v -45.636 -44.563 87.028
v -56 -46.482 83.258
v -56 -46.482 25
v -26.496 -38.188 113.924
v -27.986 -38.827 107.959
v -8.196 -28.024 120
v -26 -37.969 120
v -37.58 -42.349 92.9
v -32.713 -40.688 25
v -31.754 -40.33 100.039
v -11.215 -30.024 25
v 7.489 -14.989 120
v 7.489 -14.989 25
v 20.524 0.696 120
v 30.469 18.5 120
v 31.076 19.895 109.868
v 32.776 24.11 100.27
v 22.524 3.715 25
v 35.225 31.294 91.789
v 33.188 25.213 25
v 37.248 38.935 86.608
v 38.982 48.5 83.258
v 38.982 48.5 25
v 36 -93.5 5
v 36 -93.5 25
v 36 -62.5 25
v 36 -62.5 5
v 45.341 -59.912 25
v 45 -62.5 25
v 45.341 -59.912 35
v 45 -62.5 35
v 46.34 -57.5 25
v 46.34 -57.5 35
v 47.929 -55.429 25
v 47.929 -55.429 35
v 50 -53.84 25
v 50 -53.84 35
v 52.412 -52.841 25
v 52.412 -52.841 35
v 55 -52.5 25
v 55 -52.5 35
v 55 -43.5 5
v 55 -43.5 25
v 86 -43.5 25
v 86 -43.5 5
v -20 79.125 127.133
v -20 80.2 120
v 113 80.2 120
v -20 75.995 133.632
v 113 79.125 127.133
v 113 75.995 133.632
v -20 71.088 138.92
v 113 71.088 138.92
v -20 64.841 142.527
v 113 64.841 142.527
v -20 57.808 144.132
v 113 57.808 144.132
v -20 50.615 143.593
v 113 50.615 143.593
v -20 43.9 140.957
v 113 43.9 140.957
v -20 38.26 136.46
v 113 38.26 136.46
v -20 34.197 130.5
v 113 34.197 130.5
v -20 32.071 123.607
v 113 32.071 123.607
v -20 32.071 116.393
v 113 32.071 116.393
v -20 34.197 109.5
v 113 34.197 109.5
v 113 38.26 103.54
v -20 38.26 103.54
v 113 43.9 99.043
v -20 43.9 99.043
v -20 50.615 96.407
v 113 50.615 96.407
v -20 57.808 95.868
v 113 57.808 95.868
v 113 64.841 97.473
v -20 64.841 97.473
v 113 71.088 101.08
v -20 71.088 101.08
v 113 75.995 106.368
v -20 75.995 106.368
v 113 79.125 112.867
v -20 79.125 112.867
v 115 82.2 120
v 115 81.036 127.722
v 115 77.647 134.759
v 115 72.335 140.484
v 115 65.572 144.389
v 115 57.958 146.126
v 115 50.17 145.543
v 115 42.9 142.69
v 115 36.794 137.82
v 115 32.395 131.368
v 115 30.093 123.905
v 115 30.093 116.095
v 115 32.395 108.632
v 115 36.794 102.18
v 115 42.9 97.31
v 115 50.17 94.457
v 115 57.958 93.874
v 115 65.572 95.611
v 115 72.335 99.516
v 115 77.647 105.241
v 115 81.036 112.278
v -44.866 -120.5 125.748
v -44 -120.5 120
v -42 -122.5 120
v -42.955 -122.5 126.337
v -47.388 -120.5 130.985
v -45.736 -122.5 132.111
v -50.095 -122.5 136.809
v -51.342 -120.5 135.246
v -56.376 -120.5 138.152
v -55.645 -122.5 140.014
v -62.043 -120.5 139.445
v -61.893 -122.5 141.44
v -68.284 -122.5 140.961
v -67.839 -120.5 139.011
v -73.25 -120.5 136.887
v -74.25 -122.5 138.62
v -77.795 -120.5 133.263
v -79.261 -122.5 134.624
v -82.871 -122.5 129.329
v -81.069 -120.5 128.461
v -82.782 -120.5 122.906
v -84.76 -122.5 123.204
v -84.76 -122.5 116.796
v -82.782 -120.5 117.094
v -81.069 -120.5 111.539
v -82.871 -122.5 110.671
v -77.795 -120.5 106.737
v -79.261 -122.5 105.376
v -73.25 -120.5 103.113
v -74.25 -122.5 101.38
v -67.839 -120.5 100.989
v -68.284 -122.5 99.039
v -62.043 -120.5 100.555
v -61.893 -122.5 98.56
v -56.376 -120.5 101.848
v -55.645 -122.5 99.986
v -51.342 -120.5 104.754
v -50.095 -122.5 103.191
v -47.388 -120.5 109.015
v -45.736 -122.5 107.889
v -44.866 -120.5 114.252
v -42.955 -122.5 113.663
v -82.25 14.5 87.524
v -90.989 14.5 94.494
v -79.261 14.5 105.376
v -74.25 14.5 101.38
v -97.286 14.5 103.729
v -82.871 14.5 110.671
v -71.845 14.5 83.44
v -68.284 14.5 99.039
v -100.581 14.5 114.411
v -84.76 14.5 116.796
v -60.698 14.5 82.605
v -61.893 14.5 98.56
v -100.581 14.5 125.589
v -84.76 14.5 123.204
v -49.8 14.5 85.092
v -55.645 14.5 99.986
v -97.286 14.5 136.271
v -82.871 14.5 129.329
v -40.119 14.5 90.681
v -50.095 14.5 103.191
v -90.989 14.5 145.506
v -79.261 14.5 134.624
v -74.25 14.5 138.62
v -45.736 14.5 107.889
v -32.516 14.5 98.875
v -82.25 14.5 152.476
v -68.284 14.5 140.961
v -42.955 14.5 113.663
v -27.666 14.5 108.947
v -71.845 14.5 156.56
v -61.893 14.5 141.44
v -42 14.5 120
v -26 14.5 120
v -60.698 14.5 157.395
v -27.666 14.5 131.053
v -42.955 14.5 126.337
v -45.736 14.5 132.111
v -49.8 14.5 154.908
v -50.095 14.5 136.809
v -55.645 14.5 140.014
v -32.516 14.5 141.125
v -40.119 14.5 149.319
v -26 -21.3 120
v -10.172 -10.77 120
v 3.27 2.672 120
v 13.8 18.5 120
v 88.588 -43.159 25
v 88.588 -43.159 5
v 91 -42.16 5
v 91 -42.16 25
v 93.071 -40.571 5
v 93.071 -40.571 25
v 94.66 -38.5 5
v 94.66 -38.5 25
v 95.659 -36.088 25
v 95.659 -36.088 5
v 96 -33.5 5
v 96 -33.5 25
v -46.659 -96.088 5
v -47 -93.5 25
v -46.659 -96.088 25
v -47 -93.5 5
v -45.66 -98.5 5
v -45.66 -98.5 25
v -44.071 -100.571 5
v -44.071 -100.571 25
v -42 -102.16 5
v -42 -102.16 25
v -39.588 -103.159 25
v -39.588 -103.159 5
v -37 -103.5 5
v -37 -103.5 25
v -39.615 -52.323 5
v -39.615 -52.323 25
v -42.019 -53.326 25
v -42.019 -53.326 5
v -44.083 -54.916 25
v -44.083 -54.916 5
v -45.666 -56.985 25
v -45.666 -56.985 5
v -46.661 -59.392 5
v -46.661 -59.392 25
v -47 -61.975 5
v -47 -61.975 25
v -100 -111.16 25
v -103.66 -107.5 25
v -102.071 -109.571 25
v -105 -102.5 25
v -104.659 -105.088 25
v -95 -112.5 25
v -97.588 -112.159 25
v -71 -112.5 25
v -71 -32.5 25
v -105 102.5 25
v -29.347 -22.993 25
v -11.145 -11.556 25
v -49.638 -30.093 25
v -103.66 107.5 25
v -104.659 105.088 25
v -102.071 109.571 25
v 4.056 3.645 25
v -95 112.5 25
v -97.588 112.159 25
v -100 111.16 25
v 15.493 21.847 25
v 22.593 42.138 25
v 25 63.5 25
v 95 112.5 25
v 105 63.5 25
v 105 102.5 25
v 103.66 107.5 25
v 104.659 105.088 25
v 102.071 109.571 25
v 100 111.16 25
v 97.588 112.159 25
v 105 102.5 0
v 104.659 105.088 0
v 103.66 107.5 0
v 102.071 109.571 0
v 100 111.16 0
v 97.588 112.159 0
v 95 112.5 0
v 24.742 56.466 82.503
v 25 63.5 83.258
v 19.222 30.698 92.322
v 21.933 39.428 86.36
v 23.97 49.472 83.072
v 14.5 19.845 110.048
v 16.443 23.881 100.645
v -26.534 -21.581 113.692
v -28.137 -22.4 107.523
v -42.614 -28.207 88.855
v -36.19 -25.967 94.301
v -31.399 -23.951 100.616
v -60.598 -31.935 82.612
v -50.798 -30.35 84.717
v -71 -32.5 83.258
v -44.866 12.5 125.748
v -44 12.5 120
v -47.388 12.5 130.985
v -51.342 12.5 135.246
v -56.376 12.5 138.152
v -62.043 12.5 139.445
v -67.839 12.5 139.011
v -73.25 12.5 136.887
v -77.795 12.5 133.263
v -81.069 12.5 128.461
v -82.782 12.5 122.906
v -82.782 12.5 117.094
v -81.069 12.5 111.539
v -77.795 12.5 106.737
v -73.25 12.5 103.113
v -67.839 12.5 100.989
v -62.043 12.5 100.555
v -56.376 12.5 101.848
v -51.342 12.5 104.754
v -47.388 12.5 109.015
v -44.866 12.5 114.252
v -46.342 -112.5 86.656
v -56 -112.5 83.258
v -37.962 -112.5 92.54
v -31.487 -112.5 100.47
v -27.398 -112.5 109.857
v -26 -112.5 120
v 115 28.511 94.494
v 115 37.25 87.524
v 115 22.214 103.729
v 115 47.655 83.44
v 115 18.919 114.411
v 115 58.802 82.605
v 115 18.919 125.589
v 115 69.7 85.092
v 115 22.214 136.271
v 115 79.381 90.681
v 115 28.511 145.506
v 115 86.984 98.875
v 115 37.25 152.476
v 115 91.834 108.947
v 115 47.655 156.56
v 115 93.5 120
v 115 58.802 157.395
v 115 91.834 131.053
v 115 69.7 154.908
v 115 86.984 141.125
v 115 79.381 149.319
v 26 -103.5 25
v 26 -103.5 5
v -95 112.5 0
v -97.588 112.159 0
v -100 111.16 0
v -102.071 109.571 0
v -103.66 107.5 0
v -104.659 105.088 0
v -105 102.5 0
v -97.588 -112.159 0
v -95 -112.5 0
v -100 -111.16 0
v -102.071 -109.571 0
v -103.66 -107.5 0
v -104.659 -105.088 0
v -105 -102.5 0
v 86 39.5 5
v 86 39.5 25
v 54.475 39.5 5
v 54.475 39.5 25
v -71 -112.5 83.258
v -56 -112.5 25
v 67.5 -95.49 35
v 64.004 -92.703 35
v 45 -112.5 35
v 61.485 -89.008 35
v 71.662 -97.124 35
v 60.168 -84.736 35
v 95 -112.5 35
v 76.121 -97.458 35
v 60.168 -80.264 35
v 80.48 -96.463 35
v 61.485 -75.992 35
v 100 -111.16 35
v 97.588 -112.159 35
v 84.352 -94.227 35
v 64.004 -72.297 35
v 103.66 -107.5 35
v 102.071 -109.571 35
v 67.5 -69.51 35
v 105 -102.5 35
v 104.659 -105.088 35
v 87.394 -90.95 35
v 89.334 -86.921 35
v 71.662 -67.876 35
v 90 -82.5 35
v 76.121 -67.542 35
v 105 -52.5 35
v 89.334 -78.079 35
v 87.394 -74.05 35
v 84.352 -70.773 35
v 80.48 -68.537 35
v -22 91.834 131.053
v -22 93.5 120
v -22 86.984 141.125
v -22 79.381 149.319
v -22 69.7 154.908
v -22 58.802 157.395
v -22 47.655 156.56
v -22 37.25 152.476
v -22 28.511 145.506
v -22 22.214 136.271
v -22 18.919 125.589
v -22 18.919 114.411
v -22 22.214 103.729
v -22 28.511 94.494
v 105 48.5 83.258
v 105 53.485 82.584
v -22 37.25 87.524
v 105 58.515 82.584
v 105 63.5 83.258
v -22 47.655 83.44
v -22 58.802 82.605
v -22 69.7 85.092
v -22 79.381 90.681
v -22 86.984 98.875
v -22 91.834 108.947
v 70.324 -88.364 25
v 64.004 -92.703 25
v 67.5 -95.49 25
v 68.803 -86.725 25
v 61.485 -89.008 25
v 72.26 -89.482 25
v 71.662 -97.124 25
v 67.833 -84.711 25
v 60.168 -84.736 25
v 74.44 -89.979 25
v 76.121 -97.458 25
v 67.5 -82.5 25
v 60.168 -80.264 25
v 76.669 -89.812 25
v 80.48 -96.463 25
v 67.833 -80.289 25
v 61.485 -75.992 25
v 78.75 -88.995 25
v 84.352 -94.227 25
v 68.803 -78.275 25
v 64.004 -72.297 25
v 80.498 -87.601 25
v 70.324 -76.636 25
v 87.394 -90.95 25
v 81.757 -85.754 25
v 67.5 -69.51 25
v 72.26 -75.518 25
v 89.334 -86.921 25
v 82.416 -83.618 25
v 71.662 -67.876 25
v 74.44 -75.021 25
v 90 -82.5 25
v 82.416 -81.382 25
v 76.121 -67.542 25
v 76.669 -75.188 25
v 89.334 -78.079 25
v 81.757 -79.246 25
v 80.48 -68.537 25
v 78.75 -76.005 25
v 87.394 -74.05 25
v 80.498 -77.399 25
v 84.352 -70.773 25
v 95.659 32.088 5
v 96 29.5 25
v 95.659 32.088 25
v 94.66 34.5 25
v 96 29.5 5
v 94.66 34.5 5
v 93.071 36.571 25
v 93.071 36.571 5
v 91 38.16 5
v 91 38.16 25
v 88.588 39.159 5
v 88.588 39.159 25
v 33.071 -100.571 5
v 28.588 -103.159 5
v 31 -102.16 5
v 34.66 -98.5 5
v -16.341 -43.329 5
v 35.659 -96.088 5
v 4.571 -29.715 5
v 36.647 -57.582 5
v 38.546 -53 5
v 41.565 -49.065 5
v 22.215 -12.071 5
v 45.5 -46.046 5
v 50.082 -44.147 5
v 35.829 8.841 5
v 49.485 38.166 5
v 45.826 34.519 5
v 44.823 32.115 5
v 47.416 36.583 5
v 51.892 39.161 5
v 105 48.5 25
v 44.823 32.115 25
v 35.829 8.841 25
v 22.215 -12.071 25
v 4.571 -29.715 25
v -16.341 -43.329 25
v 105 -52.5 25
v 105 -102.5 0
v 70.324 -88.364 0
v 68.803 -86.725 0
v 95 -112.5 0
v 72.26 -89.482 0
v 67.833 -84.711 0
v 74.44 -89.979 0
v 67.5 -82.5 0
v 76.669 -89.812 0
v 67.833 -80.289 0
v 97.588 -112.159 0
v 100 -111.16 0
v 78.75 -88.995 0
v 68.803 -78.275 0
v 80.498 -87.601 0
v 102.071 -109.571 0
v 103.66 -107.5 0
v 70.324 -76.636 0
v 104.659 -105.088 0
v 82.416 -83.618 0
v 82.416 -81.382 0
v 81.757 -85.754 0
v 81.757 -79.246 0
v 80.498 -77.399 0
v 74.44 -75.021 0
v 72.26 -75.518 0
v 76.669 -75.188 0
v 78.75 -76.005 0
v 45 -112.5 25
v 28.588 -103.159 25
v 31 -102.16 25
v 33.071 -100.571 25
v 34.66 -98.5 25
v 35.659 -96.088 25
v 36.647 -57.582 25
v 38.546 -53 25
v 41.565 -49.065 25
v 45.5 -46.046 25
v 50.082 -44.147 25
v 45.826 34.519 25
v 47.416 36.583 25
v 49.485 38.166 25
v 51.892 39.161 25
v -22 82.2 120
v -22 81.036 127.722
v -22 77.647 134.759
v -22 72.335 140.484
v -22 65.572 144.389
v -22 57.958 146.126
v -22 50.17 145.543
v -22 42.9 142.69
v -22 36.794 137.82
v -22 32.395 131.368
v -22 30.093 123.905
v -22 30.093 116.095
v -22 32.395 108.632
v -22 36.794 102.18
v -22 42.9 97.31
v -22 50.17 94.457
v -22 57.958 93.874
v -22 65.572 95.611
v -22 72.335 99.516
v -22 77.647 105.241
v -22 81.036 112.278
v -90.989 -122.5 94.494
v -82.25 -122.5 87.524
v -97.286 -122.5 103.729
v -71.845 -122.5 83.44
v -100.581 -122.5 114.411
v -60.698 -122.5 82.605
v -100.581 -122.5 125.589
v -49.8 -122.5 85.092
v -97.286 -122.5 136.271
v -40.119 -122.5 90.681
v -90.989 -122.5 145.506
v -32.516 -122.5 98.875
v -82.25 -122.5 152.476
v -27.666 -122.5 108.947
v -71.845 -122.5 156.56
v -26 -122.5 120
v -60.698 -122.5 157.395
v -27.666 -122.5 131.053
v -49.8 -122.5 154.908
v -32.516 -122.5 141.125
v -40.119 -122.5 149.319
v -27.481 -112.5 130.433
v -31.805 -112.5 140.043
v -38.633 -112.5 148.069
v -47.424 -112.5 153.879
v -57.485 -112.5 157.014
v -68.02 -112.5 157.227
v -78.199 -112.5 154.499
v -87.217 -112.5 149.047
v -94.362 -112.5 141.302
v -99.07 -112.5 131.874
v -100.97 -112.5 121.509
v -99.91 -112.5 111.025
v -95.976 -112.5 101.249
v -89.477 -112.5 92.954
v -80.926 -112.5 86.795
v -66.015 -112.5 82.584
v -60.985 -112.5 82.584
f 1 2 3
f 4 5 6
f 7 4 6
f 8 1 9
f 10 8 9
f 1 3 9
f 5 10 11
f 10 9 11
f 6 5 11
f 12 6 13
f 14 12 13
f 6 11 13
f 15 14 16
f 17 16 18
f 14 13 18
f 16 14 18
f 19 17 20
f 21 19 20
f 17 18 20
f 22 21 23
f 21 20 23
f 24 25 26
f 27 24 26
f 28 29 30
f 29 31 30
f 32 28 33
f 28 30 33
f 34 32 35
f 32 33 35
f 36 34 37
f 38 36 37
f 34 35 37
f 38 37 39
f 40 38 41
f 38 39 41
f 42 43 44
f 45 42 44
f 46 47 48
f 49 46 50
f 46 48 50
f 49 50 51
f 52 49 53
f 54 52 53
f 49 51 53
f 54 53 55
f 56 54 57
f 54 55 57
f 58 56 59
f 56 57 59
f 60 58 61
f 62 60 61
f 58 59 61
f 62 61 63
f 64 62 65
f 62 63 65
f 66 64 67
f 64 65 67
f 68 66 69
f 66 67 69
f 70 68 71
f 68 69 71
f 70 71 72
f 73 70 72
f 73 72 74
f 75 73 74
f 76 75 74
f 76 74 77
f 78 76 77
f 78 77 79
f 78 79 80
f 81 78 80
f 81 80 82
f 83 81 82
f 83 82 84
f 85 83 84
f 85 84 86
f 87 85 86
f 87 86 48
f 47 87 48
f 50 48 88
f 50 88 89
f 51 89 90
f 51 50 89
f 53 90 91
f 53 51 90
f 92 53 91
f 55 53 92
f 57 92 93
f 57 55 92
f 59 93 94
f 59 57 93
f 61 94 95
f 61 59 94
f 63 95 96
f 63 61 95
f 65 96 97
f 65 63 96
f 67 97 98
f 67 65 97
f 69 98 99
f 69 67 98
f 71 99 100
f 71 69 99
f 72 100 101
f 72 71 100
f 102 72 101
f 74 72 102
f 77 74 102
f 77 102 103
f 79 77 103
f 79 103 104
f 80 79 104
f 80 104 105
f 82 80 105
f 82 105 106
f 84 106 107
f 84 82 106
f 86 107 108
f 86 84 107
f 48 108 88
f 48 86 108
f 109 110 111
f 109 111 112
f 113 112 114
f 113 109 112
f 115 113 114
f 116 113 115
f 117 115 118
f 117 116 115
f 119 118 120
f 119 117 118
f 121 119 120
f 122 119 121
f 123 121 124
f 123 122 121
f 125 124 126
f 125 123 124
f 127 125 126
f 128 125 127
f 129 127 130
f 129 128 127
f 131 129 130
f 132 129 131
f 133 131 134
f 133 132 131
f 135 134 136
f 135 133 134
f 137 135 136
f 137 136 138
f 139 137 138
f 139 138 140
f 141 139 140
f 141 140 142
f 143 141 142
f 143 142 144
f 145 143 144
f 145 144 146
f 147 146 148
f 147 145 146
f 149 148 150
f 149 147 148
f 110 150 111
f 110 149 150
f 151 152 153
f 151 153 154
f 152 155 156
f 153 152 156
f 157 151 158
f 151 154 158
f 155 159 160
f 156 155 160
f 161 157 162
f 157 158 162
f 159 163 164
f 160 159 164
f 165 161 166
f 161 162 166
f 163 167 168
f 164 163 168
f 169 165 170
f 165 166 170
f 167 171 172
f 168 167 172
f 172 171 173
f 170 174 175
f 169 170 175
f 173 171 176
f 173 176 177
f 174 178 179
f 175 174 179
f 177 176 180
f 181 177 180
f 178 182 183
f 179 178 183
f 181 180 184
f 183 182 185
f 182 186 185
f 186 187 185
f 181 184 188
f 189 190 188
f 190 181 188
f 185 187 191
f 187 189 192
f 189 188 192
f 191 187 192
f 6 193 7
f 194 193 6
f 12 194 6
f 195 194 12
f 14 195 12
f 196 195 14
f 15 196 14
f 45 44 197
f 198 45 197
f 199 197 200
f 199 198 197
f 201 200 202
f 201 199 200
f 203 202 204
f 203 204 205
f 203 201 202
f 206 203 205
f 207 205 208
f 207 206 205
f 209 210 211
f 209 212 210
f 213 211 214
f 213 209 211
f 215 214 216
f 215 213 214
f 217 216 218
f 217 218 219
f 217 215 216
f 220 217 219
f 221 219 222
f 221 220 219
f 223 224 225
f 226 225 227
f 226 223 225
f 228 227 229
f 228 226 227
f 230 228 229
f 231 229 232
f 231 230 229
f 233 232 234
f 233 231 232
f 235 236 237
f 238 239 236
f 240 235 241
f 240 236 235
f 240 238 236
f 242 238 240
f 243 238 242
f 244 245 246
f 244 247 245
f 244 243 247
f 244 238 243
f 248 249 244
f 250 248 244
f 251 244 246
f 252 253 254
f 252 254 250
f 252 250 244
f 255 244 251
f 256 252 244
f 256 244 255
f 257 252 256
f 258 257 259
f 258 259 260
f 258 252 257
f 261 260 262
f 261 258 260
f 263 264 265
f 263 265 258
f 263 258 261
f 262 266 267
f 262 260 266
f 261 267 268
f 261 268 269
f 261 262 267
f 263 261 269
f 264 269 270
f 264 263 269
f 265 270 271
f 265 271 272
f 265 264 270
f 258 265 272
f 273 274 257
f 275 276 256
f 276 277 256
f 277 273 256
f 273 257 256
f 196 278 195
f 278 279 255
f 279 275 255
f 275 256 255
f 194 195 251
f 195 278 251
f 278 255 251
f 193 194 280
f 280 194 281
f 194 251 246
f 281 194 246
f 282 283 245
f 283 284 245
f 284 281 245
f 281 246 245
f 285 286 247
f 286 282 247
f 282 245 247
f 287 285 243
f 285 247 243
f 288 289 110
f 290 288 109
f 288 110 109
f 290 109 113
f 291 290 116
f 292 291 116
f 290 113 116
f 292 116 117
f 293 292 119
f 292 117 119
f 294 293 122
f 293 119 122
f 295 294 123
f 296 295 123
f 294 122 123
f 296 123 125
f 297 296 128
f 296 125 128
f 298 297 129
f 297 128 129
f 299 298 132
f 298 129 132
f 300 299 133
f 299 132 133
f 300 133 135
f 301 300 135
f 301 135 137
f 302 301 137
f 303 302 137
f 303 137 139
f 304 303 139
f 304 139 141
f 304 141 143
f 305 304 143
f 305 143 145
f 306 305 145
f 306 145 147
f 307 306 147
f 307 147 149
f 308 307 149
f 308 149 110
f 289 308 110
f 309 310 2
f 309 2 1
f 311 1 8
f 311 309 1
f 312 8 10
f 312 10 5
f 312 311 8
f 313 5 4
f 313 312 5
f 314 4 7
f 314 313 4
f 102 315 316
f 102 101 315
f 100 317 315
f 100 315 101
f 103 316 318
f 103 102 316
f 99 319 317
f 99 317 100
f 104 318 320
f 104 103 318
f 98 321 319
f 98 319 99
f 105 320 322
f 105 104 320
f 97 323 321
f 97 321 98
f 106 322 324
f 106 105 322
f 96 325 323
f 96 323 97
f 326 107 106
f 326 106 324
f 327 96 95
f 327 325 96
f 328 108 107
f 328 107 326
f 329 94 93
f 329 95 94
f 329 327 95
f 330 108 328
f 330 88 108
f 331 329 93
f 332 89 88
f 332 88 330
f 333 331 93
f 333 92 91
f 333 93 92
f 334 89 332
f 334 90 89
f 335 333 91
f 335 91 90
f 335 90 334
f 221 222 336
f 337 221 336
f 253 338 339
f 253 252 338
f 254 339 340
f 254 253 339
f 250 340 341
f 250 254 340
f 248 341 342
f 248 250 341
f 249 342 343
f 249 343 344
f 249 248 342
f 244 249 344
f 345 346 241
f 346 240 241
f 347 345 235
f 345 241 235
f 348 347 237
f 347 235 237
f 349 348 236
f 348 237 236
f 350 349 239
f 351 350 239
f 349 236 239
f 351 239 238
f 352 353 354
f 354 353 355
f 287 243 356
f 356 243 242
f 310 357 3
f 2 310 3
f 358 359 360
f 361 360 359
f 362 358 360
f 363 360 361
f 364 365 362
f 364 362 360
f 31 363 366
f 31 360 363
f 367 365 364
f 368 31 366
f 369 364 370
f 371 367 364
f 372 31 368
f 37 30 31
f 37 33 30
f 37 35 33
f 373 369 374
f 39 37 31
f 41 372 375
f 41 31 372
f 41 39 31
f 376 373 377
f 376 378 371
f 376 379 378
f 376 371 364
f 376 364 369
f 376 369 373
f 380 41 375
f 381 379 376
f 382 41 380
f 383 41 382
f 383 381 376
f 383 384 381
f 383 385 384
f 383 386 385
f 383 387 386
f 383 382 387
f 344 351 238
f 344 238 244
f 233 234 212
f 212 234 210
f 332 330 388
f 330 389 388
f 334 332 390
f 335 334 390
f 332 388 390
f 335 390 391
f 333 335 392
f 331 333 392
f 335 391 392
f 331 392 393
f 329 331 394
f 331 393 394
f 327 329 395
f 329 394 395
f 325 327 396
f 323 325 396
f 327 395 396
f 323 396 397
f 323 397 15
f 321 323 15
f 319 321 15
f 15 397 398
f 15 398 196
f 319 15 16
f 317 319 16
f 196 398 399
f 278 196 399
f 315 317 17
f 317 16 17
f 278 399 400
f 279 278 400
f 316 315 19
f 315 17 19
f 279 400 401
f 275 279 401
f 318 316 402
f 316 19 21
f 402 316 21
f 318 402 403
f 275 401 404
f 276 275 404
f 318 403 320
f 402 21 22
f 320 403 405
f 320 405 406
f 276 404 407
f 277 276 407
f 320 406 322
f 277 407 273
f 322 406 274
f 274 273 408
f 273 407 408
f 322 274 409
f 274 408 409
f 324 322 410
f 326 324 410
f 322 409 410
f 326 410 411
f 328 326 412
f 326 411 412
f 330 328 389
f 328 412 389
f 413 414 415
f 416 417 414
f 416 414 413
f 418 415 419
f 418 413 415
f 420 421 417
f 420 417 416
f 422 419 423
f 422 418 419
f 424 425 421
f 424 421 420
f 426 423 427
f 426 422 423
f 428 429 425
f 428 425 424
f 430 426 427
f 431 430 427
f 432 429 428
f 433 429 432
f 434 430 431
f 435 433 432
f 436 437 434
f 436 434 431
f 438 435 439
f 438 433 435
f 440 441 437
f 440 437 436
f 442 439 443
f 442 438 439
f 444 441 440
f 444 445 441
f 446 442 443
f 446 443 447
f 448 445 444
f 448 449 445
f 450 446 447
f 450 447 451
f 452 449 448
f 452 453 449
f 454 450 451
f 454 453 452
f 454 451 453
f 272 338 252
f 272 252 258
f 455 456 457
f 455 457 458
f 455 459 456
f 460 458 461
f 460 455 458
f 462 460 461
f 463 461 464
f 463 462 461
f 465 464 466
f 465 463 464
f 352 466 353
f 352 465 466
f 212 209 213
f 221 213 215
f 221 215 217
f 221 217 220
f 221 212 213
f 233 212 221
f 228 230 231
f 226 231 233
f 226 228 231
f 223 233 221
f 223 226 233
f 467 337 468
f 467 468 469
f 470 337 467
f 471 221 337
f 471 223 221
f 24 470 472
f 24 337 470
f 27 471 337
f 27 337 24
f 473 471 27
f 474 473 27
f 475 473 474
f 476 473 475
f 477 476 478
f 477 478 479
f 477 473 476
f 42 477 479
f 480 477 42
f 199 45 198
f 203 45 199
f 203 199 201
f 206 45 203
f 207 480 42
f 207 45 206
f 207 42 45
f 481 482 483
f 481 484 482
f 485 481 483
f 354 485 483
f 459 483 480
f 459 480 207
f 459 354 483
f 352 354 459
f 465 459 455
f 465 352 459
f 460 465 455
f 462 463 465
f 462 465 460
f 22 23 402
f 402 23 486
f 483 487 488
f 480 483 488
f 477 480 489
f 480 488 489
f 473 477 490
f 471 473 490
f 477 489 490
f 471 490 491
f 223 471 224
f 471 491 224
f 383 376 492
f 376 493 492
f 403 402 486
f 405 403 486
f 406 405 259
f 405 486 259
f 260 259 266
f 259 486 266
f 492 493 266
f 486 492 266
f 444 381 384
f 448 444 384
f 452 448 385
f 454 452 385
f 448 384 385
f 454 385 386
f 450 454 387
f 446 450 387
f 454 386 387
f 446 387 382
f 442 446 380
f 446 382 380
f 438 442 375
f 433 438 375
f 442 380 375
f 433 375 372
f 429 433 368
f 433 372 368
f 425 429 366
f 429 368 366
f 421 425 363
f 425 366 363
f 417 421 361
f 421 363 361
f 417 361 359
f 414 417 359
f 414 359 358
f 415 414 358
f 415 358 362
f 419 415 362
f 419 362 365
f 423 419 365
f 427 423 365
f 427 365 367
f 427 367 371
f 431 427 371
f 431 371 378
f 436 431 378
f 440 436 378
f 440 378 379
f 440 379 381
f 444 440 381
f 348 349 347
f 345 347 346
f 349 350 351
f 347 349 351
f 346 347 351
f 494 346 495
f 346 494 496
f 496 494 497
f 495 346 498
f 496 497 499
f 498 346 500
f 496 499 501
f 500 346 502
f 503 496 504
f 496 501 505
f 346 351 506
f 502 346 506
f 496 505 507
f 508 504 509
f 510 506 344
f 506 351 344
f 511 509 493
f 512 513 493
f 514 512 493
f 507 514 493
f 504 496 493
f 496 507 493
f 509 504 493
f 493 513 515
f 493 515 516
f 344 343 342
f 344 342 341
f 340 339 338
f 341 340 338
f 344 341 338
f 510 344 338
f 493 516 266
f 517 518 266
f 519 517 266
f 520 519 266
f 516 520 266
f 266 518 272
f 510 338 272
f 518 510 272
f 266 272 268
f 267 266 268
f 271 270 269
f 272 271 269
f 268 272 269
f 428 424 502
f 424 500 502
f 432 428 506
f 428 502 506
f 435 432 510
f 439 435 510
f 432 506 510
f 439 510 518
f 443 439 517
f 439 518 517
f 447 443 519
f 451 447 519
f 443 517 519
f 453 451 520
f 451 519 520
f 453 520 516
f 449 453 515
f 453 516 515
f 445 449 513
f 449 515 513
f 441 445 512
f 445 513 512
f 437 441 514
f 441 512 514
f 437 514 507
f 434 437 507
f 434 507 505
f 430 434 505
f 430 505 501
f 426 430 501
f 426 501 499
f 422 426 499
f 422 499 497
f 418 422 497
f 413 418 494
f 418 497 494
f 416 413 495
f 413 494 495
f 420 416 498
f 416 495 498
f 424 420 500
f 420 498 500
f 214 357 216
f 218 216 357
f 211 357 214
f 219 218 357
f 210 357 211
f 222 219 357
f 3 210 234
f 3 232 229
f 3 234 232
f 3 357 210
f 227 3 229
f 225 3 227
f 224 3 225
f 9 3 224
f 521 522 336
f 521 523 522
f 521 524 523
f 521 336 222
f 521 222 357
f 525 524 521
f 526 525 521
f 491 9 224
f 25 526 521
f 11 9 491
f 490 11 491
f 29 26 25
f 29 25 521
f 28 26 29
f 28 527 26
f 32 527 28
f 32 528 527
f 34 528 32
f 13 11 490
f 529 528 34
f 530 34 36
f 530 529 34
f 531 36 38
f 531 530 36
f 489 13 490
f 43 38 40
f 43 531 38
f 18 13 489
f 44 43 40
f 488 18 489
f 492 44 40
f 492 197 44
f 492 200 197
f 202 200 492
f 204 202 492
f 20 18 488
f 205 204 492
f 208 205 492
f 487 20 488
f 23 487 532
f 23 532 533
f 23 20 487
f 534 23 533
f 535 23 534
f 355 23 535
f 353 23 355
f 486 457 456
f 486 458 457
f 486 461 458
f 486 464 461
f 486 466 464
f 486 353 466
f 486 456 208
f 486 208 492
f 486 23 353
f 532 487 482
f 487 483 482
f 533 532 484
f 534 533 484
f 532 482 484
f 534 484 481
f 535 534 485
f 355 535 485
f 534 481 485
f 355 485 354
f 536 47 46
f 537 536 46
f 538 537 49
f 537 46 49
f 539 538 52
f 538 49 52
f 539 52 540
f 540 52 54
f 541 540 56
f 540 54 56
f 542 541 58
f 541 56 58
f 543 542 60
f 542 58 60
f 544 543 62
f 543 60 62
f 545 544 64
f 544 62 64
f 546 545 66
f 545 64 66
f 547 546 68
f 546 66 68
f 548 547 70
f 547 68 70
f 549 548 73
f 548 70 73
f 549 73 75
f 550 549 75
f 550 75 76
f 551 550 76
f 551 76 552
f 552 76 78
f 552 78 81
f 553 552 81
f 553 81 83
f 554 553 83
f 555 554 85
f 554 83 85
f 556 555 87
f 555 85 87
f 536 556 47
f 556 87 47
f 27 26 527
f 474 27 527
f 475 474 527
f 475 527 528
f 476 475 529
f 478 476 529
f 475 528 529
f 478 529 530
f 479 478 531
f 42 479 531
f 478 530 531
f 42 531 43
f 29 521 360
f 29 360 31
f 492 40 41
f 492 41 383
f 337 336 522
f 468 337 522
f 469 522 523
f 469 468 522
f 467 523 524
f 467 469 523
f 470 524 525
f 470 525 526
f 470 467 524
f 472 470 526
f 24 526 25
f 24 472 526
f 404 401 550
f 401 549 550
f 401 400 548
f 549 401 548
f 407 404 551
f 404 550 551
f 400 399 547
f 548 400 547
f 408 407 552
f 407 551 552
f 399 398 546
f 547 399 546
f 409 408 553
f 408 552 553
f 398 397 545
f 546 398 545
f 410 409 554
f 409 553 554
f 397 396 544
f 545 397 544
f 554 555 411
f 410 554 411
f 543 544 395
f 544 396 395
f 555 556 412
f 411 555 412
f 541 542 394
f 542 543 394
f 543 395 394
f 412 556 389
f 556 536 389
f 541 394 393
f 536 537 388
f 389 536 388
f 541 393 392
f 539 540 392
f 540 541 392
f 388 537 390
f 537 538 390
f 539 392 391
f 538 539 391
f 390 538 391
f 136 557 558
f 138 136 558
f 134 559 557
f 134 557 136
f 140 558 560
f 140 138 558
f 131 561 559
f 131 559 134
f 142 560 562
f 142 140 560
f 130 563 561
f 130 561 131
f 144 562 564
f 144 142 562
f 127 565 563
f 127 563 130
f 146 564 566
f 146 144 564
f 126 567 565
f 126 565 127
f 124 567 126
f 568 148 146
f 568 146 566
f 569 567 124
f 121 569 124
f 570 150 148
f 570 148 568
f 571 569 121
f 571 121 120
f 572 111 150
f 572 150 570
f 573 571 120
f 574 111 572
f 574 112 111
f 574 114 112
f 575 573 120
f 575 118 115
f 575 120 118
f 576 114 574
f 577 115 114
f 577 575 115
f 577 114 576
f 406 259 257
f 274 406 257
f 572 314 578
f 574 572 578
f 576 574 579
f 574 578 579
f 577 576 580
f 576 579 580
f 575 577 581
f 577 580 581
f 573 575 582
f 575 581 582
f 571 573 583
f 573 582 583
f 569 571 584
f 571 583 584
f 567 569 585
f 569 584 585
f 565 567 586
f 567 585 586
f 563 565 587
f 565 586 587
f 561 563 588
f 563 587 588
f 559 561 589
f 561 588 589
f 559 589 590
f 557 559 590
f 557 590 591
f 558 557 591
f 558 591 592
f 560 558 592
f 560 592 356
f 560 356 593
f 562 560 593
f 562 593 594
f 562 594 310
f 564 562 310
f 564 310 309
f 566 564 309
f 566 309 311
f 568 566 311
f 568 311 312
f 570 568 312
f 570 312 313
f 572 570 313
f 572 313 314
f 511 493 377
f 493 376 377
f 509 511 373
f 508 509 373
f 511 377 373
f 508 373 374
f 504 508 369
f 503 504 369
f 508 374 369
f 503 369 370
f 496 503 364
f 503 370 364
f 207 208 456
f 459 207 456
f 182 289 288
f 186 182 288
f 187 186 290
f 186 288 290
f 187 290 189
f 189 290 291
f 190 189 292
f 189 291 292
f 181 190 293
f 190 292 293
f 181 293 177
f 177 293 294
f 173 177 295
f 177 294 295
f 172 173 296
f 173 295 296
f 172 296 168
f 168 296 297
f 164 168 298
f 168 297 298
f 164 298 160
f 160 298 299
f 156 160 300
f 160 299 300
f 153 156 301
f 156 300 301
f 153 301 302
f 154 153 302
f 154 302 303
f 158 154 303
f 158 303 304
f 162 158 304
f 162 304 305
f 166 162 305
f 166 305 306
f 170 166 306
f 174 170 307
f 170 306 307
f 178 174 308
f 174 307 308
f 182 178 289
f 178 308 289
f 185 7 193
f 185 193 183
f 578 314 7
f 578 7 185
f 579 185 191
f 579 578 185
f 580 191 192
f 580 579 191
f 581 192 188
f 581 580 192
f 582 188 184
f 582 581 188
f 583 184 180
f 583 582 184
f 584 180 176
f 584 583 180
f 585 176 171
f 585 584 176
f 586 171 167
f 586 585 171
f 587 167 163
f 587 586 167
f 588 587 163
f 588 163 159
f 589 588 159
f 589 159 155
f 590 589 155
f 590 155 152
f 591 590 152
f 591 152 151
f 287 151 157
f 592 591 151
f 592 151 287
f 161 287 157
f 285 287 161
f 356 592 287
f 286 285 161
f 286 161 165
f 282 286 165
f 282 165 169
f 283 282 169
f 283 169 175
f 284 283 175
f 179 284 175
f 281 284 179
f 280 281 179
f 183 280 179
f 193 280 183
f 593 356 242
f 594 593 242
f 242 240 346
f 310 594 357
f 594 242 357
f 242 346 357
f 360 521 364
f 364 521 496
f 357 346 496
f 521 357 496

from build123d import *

# Parameters (mm, degrees)
F0_W            = 210
F0_H            = 225
F1_DEPTH        = 25
F3_DEPTH        = 95
F4_R            = 37.5
F5_DEPTH        = 10
F5_DEPTH_BACK   = 127
F6_R            = 37.5
F7_DEPTH        = 10
F7_DEPTH_BACK   = 127
F8_W            = 60
F8_H            = 60
F9_DEPTH        = 10
F10_R           = 10
F12_DEPTH       = 20
F14_D           = 15
F14_CBORE_D     = 30
F14_CBORE_DEPTH = 10
F15_R           = 10
F16_R           = 19.5
F17_DEPTH       = 235.001
F18_R           = 24.199633
F19_DEPTH       = 220.001
F20_SIZE        = 2
F21_R           = 10


with BuildPart() as f1:
    # F0 (on Top) → F1 (new body)
    with BuildSketch(Plane.XY):
        Rectangle(F0_W, F0_H)
    extrude(amount=F1_DEPTH)

    # F2 (on face) → F3 (join)
    with BuildSketch(Plane.XY.offset(25)):
        with BuildLine():
            Line((-71, -32.5), (-71, -112.5))
            Line((-71, -112.5), (-56, -112.5))
            Line((-56, -112.5), (-56, -46.481817))
            ThreePointArc((-56, -46.481817), (7.488853, -14.988853), (38.981817, 48.5))
            Line((38.981817, 48.5), (105, 48.5))
            Line((105, 48.5), (105, 63.5))
            Line((105, 63.5), (25, 63.5))
            ThreePointArc((25, 63.5), (-3.117749, -4.382251), (-71, -32.5))
        make_face()
    extrude(amount=F3_DEPTH)

    # F4 (on face) → F5 (join, two sides)
    with BuildSketch(Plane.XZ.offset(112.5)) as f5_sk:
        with Locations((-63.5, 120)):
            Circle(F4_R)
    extrude(amount=F5_DEPTH)
    extrude(f5_sk.sketch, amount=-F5_DEPTH_BACK)

    # F6 (on face) → F7 (join, two sides)
    with BuildSketch(Plane.YZ.offset(105)) as f7_sk:
        with Locations((56, 120)):
            Circle(F6_R)
    extrude(amount=F7_DEPTH)
    extrude(f7_sk.sketch, amount=-F7_DEPTH_BACK)

    # F8 (on face) → F9 (join)
    with BuildSketch(Plane.XY.offset(25)):
        with Locations((75, -82.5)):
            Rectangle(F8_W, F8_H)
    extrude(amount=F9_DEPTH)

    # F10
    f10_edges = [f1.edges().sort_by_distance(p)[0] for p in [
        (45, -52.5, 30),
    ]]
    fillet(f10_edges, radius=F10_R)

    # F11 (on face) → F12 (cut)
    with BuildSketch(Plane.XY.offset(25)):
        with BuildLine():
            ThreePointArc((46.575508, 39.5), (13.852814, -21.352814), (-47, -54.075508))
            Line((-47, -54.075508), (-47, -103.5))
            Line((-47, -103.5), (36, -103.5))
            Line((36, -103.5), (36, -62.5))
            ThreePointArc((36, -62.5), (41.564971, -49.064971), (55, -43.5))
            Line((55, -43.5), (96, -43.5))
            Line((96, -43.5), (96, 39.5))
            Line((96, 39.5), (46.575508, 39.5))
        make_face()
    extrude(amount=-F12_DEPTH, mode=Mode.SUBTRACT)

    # F14 (through all)
    with Locations(Plane.XY.offset(35)):
        with Locations((75, -82.5)):
            CounterBoreHole(F14_D / 2, F14_CBORE_D / 2, F14_CBORE_DEPTH)

    # F15
    f15_edges = [f1.edges().sort_by_distance(p)[0] for p in [
        (46.575508, 39.5, 15),
        (-47, -54.075508, 15),
        (-47, -103.5, 15),
        (96, 39.5, 15),
        (96, -43.5, 15),
        (36, -103.5, 15),
    ]]
    fillet(f15_edges, radius=F15_R)

    # F16 (on face) → F17 (cut, through all)
    with BuildSketch(Plane.XZ.offset(122.5)):
        with Locations((-63.5, 120)):
            Circle(F16_R)
    extrude(amount=-F17_DEPTH, mode=Mode.SUBTRACT)

    # F18 (on face) → F19 (cut, through all)
    with BuildSketch(Plane.YZ.offset(115)):
        with Locations((56, 120)):
            Circle(F18_R)
    extrude(amount=-F19_DEPTH, mode=Mode.SUBTRACT)

    # F20
    f20_edges = [f1.edges().sort_by_distance(p)[0] for p in [
        (-83, -122.5, 120),
        (115, 31.800367, 120),
        (-22, 31.800367, 120),
        (-83, 14.5, 120),
    ]]
    chamfer(f20_edges, length=F20_SIZE)

    # F21
    f21_edges = [f1.edges().sort_by_distance(p)[0] for p in [
        (-105, -112.5, 12.5),
        (105, -112.5, 17.5),
        (105, 112.5, 12.5),
        (-105, 112.5, 12.5),
    ]]
    fillet(f21_edges, radius=F21_R)


solid = f1.part
